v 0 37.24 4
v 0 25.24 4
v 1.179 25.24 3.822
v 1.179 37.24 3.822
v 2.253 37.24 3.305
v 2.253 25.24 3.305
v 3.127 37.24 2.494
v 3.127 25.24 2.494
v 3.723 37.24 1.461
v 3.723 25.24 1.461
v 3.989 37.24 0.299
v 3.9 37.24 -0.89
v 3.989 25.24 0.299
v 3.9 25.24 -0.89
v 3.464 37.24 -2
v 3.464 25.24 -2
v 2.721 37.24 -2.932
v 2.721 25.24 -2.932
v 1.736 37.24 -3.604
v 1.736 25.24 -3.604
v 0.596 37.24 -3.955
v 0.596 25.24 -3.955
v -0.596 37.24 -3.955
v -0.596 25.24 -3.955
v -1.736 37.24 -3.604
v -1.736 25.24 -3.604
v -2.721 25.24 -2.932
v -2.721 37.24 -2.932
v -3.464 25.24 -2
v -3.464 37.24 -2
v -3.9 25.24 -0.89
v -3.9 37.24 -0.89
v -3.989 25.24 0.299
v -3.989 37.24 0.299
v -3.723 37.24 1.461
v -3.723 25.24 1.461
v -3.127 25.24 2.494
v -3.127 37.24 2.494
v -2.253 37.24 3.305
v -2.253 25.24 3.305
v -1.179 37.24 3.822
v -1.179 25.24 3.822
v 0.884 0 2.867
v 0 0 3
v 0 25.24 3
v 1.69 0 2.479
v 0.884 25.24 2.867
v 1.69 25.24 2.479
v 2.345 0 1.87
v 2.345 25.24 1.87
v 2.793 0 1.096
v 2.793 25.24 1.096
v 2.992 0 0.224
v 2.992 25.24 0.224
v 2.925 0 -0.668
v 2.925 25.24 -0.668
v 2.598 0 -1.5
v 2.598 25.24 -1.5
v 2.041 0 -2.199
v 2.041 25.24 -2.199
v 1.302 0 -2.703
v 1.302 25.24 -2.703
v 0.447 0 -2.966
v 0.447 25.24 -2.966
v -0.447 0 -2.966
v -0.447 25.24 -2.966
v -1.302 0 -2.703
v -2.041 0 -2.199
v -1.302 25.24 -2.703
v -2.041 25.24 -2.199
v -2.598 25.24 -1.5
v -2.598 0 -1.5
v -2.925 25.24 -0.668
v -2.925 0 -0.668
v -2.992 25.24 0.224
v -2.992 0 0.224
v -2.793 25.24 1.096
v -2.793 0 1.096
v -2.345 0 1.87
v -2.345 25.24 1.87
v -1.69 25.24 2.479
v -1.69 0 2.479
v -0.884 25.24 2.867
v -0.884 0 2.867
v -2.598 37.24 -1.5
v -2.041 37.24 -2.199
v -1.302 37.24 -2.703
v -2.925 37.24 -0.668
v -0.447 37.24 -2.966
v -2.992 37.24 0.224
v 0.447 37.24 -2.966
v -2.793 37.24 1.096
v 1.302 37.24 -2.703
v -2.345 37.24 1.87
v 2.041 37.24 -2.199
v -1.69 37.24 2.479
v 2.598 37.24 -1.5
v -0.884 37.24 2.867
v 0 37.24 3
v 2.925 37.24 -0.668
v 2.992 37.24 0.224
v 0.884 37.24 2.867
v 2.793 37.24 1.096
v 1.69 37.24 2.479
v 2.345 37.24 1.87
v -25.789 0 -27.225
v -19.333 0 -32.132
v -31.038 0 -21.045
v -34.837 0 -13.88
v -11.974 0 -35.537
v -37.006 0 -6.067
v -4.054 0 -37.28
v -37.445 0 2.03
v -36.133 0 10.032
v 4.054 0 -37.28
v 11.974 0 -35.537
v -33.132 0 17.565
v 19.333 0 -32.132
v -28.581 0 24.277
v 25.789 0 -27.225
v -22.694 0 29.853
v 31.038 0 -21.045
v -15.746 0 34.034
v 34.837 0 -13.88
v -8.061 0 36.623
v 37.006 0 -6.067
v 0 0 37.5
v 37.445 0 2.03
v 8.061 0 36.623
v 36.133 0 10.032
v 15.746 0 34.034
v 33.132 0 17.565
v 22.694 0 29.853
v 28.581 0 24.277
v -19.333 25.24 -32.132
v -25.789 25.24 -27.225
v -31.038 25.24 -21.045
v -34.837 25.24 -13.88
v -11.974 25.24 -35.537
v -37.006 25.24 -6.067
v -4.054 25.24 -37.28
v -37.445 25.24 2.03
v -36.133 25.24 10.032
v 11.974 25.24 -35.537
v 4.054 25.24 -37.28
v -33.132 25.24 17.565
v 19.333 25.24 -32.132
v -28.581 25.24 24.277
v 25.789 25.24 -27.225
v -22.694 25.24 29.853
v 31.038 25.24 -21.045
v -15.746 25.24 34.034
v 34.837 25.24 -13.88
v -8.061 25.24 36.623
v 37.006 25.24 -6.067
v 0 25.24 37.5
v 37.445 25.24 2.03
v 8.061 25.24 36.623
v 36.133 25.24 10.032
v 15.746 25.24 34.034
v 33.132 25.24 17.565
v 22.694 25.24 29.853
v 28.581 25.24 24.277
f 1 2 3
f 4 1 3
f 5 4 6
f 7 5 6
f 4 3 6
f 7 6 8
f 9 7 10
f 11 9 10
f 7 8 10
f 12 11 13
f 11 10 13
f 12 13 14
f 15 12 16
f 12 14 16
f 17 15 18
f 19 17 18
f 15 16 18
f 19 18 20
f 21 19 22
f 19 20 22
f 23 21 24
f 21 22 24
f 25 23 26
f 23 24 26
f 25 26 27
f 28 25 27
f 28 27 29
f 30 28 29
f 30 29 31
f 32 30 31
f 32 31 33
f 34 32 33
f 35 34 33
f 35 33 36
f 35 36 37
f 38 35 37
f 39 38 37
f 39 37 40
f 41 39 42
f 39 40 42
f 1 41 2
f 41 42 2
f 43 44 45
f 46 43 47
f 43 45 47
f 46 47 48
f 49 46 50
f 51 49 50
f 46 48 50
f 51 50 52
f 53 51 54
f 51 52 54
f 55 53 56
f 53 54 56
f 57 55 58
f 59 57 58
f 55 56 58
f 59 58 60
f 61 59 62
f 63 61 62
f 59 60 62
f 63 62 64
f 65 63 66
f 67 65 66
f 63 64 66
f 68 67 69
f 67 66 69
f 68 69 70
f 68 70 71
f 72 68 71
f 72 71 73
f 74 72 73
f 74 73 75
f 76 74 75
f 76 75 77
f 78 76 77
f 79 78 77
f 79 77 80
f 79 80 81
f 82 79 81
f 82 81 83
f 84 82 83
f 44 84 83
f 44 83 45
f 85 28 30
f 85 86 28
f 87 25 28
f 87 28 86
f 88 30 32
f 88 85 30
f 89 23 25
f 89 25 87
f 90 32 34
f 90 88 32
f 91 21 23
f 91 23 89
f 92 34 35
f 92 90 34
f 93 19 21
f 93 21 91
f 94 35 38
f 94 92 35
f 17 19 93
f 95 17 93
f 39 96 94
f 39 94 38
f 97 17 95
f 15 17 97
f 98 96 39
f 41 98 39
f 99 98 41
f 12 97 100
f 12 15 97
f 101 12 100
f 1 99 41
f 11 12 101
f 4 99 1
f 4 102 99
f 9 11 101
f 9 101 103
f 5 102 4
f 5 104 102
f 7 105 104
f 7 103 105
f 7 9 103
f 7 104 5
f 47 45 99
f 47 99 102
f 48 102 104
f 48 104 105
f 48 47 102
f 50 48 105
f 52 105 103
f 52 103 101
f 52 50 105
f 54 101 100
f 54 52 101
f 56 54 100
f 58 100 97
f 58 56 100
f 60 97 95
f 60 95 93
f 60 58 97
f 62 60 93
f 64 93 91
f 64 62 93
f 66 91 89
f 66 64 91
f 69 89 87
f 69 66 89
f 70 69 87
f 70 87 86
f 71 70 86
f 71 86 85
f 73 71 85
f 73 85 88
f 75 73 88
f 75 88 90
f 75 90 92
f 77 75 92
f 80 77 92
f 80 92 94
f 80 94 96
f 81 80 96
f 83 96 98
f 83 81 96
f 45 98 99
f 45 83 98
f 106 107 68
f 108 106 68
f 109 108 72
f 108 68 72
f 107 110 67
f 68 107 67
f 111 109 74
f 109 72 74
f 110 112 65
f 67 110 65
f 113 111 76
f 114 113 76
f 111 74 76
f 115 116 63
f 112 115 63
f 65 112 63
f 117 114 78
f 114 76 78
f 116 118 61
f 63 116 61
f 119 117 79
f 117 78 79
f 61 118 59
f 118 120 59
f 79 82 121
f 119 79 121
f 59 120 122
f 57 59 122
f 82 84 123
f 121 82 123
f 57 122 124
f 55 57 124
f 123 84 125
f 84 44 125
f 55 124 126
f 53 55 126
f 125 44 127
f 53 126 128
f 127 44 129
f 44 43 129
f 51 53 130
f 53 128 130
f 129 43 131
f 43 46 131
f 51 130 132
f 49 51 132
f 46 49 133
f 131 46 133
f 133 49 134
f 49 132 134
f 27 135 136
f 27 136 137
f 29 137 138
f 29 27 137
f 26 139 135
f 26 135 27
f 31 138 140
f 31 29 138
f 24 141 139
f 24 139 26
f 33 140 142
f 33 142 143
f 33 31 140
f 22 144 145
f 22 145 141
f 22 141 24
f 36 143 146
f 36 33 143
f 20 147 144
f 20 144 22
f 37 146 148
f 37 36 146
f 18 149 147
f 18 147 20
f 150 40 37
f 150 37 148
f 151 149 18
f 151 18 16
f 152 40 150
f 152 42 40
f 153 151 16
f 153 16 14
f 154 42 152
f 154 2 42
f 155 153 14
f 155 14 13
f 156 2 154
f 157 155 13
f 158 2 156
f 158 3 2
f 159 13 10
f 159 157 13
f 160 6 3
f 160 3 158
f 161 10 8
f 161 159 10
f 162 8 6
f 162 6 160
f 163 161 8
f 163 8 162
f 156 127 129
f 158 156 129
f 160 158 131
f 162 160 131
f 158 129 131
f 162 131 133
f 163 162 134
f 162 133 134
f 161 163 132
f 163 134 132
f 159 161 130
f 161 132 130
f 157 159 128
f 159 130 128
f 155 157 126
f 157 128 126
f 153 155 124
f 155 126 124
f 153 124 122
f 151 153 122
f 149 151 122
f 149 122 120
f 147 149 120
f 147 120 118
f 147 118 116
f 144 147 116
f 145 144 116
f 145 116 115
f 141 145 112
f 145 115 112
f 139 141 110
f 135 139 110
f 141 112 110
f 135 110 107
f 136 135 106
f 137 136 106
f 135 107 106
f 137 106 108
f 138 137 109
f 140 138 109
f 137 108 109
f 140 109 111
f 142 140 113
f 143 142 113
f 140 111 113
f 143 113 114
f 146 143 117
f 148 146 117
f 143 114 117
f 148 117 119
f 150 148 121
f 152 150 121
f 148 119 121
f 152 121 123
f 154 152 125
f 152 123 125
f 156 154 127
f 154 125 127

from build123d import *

# Parameters (mm, degrees)
SKETCH_1_R          = 37.5
EXTRUDE_1_DEPTH     = 25.24
SKETCH_2_R          = 4
SKETCH_2_R_2        = 3
EXTRUDE_2_DEPTH     = 12
CUT_EXTRUDE_1_REACH = 60.733
SKETCH_3_R          = 3


with BuildPart() as part:
    # 草图1 → 凸台-拉伸1 (new body)
    with BuildSketch(Plane(origin=(0, 0, 0), x_dir=(1, 0, 0), z_dir=(0, 1, 0))):
        with Locations(Location((0, 0, 0), (0, 0, 270))):
            Circle(SKETCH_1_R)
    extrude(amount=EXTRUDE_1_DEPTH)

    # 草图2 → 凸台-拉伸2 (add)
    with BuildSketch(Plane(origin=(0, 25.24, 0), x_dir=(1, 0, 0), z_dir=(0, 1, 0))):
        with Locations(Location((0, 0, 0), (0, 0, 270))):
            Circle(SKETCH_2_R)
        with Locations(Location((0, 0, 0), (0, 0, 270))):
            Circle(SKETCH_2_R_2, mode=Mode.SUBTRACT)
    extrude(amount=EXTRUDE_2_DEPTH)

    # 草图3 → 切除-拉伸1 (cut, up to next)
    with BuildSketch(Plane(origin=(0, 25.24, 0), x_dir=(1, 0, 0), z_dir=(0, 1, 0)), mode=Mode.PRIVATE) as cut_extrude_1_sk1:
        with Locations(Location((0, 0, 0), (0, 0, 270))):
            Circle(SKETCH_3_R)
    cut_extrude_1_tool1 = extrude(cut_extrude_1_sk1.sketch, amount=-CUT_EXTRUDE_1_REACH, mode=Mode.PRIVATE) & part.part
    add(cut_extrude_1_tool1.solids().sort_by_distance((0, 25.24, 0))[0], mode=Mode.SUBTRACT)


solid = part.part
